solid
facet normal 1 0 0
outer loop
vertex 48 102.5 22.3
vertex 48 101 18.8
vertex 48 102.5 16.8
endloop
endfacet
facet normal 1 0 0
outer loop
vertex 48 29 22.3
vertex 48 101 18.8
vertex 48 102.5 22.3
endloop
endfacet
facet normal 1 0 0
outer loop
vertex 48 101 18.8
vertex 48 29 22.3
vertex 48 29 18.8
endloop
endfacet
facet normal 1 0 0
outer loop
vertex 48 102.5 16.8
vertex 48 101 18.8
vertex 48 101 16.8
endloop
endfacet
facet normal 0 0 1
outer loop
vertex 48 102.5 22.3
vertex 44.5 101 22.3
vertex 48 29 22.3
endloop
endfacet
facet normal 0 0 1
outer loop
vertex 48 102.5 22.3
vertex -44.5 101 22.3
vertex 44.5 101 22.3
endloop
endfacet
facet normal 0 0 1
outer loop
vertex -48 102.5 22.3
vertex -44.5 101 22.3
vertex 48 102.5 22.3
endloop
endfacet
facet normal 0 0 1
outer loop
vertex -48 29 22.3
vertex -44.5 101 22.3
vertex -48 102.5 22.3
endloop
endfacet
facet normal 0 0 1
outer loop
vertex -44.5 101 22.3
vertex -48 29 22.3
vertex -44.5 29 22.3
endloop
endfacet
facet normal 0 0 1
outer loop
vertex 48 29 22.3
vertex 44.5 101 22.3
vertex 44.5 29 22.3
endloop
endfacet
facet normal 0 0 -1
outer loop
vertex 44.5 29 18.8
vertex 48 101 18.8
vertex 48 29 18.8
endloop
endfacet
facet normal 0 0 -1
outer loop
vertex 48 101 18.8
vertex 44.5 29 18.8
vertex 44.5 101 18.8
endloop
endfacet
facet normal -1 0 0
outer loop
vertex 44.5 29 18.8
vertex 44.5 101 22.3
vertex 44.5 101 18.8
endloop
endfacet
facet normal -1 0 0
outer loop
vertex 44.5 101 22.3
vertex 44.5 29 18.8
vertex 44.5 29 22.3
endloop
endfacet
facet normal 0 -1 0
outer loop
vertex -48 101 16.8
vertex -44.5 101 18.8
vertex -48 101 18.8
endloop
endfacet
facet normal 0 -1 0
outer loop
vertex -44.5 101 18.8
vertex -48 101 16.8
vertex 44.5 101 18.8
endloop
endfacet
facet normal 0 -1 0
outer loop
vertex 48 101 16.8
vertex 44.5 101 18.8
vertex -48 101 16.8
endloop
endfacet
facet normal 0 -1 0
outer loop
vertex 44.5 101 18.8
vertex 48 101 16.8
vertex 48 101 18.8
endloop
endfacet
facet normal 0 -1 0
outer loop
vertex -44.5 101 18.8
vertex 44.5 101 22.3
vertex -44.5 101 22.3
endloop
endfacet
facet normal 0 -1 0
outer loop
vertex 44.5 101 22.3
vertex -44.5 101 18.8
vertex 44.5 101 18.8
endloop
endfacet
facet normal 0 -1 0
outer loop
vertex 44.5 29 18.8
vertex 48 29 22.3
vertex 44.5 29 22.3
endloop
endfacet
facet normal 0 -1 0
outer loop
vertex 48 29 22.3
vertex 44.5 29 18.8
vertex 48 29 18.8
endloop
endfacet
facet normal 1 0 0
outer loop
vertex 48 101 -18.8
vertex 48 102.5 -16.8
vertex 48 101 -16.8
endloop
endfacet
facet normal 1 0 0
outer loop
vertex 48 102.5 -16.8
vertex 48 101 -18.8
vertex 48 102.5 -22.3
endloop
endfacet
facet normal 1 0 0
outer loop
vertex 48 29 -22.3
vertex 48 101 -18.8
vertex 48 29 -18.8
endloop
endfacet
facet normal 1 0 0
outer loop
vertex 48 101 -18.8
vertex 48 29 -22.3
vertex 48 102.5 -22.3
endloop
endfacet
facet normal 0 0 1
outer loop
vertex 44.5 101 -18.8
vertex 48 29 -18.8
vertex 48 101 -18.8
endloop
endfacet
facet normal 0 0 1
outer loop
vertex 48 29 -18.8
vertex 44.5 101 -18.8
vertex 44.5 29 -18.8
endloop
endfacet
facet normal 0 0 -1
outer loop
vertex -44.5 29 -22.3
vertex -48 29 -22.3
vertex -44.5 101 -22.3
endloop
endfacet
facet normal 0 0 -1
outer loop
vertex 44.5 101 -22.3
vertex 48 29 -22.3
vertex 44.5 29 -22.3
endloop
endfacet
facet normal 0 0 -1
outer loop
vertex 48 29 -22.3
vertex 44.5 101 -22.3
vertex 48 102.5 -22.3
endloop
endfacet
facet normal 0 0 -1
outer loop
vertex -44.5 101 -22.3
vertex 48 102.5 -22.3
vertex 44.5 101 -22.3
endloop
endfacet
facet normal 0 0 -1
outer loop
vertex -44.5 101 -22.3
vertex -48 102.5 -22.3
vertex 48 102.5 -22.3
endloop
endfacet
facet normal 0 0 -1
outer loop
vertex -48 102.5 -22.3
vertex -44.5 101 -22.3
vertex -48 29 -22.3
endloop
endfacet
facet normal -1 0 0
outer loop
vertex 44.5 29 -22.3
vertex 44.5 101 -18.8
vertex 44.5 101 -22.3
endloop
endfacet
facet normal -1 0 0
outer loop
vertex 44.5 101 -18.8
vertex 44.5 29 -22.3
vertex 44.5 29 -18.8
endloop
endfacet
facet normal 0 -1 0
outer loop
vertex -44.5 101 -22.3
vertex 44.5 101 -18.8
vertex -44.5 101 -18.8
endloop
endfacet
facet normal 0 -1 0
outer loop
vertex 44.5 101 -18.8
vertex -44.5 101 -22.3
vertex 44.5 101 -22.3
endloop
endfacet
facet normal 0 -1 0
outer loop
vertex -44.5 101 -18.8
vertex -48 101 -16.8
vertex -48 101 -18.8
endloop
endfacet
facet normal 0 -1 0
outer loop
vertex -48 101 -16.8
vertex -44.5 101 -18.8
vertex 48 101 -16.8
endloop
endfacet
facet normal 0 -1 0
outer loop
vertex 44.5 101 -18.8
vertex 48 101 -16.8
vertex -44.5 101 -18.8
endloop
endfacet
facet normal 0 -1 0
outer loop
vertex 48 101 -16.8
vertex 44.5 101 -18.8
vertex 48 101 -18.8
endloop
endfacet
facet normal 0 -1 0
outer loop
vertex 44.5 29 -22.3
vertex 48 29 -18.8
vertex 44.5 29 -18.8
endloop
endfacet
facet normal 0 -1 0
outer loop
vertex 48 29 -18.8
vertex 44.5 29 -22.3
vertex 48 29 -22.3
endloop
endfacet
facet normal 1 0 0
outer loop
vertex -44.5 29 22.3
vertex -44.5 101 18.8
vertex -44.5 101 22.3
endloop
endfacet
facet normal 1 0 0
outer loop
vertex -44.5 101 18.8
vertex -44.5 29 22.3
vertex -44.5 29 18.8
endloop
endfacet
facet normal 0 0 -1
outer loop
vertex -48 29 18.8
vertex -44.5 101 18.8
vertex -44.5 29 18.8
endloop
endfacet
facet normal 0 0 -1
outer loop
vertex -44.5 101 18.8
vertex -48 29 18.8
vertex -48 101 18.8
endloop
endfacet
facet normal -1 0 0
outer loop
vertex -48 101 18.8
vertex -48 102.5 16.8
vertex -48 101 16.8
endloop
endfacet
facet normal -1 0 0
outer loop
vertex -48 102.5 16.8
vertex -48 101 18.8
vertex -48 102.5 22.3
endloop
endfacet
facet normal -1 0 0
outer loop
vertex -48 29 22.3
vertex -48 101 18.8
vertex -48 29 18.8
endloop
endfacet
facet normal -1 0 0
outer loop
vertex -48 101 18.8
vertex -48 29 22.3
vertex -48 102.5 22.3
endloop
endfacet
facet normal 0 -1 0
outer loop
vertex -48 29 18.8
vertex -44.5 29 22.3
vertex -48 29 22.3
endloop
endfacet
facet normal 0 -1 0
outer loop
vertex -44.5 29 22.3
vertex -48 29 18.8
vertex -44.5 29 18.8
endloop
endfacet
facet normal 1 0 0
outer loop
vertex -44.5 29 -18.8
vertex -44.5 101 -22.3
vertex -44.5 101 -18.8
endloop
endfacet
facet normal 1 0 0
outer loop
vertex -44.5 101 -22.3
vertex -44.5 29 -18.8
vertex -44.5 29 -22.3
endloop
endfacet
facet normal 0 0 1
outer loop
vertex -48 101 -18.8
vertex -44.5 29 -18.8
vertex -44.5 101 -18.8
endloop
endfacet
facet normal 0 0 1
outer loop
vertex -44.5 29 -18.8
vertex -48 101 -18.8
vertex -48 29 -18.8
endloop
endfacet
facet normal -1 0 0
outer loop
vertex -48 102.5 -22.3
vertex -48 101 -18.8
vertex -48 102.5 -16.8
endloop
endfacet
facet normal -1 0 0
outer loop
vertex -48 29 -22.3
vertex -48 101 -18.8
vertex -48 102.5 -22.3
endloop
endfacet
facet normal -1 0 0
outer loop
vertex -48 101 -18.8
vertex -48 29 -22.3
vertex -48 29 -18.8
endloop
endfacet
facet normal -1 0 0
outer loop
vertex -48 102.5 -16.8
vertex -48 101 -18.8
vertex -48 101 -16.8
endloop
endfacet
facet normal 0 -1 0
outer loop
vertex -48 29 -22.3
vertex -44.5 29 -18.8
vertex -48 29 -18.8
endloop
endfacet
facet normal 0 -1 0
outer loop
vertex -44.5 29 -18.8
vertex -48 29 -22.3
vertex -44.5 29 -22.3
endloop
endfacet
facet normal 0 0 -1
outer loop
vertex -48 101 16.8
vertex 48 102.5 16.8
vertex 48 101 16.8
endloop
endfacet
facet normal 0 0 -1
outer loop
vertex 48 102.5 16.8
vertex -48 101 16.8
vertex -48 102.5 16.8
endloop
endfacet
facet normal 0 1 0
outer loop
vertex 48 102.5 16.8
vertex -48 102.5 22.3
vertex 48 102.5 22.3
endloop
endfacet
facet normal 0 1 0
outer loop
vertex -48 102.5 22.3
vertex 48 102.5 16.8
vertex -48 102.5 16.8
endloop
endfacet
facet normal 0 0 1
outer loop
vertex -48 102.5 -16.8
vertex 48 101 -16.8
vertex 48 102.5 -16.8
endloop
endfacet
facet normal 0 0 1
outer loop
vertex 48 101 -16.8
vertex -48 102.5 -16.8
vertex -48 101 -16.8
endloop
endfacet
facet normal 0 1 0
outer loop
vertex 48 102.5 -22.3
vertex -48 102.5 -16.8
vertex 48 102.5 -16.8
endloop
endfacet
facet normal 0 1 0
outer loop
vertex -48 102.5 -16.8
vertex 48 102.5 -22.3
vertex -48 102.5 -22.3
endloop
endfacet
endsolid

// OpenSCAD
// file: ../wattplot_params.scad
// =============================================================================
// wattplot_params.scad -- mirror of wattplot_params.py
// =============================================================================
//
// DO NOT EDIT THESE NUMBERS WITHOUT UPDATING wattplot_params.py AND
// firmware/tests/test_openscad_params.py.
//
// The Python source of truth is wattplot_params.py at the repo root.
// This file is a hand-maintained mirror so the OpenSCAD models can
// render without Python. A CI test (test_openscad_params.py) reads
// both and fails if any number has drifted.
//
// If you change a value here, change it in wattplot_params.py first
// and update the test expectations in test_openscad_params.py. The
// commit message should reference the param name (e.g.
// "scad: bump POSTS.height_in to 78 for v3.1 storm margin").
//
// All dimensions are in inches. OpenSCAD's $fn controls mesh
// resolution -- 64 gives a clean STL that's about 2 MB at this
// model's complexity.

// ---------- LOCATION ----------
location_latitude  = 33.45;     // Phoenix, AZ
location_longitude = -112.07;
location_elevation_m = 337;
location_design_wind_mph = 115.0; // ASCE 7-22, Risk Cat II 700-yr

// ---------- PLANTER LIMITS ----------
max_planter_L_in = 96.0;          // 8 ft stock, no waste on long rails
max_planter_W_in = 60.0;          // 5 ft (8 ft cross-cut, 2 cross-rails per board)

// ---------- BED (planter, ballasted) ----------
bed_outer_L_in       = 96.0;       // 8 ft (capped at max_planter_L_in)
bed_outer_W_in       = 44.6;       // matches panel width
bed_wall_thk_in      = 0.75;       // 1x6 cedar (3/4" actual)
bed_wall_h_in        = 27.5;       // 5 courses of 1x6 (5.5" actual)
                                   //   wind-sized: SF_overturning 2.55 at 35°
bed_soil_fill_in     = 25.5;       // 2" freeboard below the rim
                                   //   ~60 cu ft = 2.2 cu yd = ~4,000 lb
bed_skid_h_in        = 1.5;        // walls rest on 2x4 footers
bed_skid_side_in     = 3.5;        // 4x nominal

// ---------- BED WALL (1x6 cedar skin over 2x4 cleats) ----------
wall_skin_thk_in   = 0.75;
wall_course_h_in   = 5.5;
wall_courses       = 5;            // 5 x 5.5" = 27.5" wall
wall_cleat_thk_in  = 1.5;          // 2x4 actual
wall_cleat_wid_in  = 3.5;          // 2x4 actual
wall_cleats_long   = 5;            // per long wall
wall_cleats_short  = 3;            // per short wall
wall_header_thk_in = 1.5;         // 2x4 on wide face
wall_header_wid_in = 3.5;

// ---------- POSTS (4x4 PT, 72" tall, walk-under canopy) ----------
post_thk_in  = 3.5;               // 4x4 actual
post_height_in = 72.0;            // 6 ft -- walk-under / reach-under
post_count   = 4;
post_rail_thk_in = 1.5;          // 2x6 on post tops
post_rail_wid_in = 5.5;

// ---------- PANEL (LONGi Hi-MO X10 620W default) ----------
panel_L_in        = 97.0;         // 8.08 ft (overhangs bed 0.5"/side)
panel_W_in        = 44.6;         // 3.72 ft
panel_thk_in      = 1.4;
panel_mass_lb     = 65.0;
panel_wattage     = 620;
panel_tilt_deg    = 35.0;         // 0 = flat, 35 = max (wind-limited)

// ---------- CONTROL (tilt cap + PI setpoint) ----------
control_max_tilt_deg  = 35.0;     // STRUCTURAL cap. See ADR-001.
control_target_current_A = 0.5;
control_hard_current_limit_A = 2.5;

// ---------- FRAME (perimeter around the panel) ----------
frame_long_rail_thk_in   = 1.5;    // 2x6 actual
frame_long_rail_wid_in   = 5.5;
frame_long_rail_length_in = 96.0;  // 8 ft stock, no waste

frame_cross_rail_thk_in   = 1.5;   // 2x6 actual
frame_cross_rail_wid_in   = 5.5;
frame_cross_rail_length_in = 42.0; // 2x6x8ft cut to 42"

frame_brace_thk_in   = 1.5;         // 2x4 actual
frame_brace_wid_in   = 3.5;
frame_brace_length_in = 102.0;     // 2x4x10ft cut to 102"

// ---------- HINGES + PANEL CLAMPS ----------
hinge_leaf_in    = 4.0;            // 4"x4" leaf, 1/2" pin
hinge_pin_d_in    = 0.5;
hinge_count      = 4;
hinge_spacing_in = 22.0;           // 22" o.c.
hinge_rod_length_in = 72.0;        // 1/2" x 72" steel rod (HD)

panel_clamp_length_in = 2.0;       // IronRidge mid-clamp, 35mm channel
panel_clamp_height_in = 2.0;
panel_clamp_thk_in   = 0.4;
panel_clamps_per_long_rail  = 2;
panel_clamps_per_cross_rail = 1;

// ---------- ACTUATOR MOUNT ----------
actuator_block_thk_in  = 1.5;      // 2x6 actual
actuator_block_wid_in  = 5.5;
actuator_block_length_in = 6.0;
actuator_stroke_in     = 4.0;       // 12V linear actuator
actuator_width_in      = 2.0;       // body width (for clearance check)
actuator_height_in     = 2.5;

// ---------- DERIVED (don't change) ----------
// Bed is sized so the panel overhangs the rails by 0.5" per side.
// The panel mid-clamps grip the aluminum frame, not the glass.
bed_inner_L_in = bed_outer_L_in - 2 * post_thk_in;
bed_inner_W_in = bed_outer_W_in - 2 * wall_skin_thk_in;
// Wall sits on top of skid; rim = wall + skid.
bed_rim_h_in = bed_wall_h_in + bed_skid_h_in;
// Panel frame offset above the bed rail (clearance for the clamp).
panel_clearance_in = 2.0;         // 2" above the rail top

// Render resolution: $fn controls segment count for curves.
// 64 gives a clean STL ~2 MB. Lower for fast preview, higher for
// 3D printing.
$fn = 64;
// main file
// =============================================================================
// parts/posts.scad -- the 4 corner posts + the 2 panel rails on top
// =============================================================================

include <../wattplot_params.scad>

module posts_assembly() {
    // The 4 posts at the bed corners (outside the wall thickness)
    color(col_post_default)
    post( bed_outer_L_in/2 - post_thk_in/2,  bed_outer_W_in/2 - post_thk_in/2);
    color(col_post_default)
    post( bed_outer_L_in/2 - post_thk_in/2, -bed_outer_W_in/2 + post_thk_in/2);
    color(col_post_default)
    post(-bed_outer_L_in/2 + post_thk_in/2,  bed_outer_W_in/2 - post_thk_in/2);
    color(col_post_default)
    post(-bed_outer_L_in/2 + post_thk_in/2, -bed_outer_W_in/2 + post_thk_in/2);
    
    // Panel rails: 2x6 PT DF on top of the post tops, parallel to
    // the bed long axis. These carry the panel + frame.
    color(col_frame_default)
    translate([0, bed_rim_h_in + post_height_in + post_rail_thk_in/2,  bed_outer_W_in/2 - post_rail_wid_in/2])
        cube([bed_outer_L_in, post_rail_thk_in, post_rail_wid_in], center=true);
    color(col_frame_default)
    translate([0, bed_rim_h_in + post_height_in + post_rail_thk_in/2, -bed_outer_W_in/2 + post_rail_wid_in/2])
        cube([bed_outer_L_in, post_rail_thk_in, post_rail_wid_in], center=true);
}

// Single-post helper. Use posts_assembly() for the full set.
module post(x, z) {
    color(col_post_default)
    translate([x, bed_rim_h_in + post_height_in/2, z])
        cube([post_thk_in, post_height_in, post_thk_in], center=true);
}

col_post_default  = [0.70, 0.55, 0.40];
col_frame_default = [0.90, 0.90, 0.88];   // 2x6 painted

if (is_undef($use_only)) {
    $fn = 64;
    posts_assembly();
}
